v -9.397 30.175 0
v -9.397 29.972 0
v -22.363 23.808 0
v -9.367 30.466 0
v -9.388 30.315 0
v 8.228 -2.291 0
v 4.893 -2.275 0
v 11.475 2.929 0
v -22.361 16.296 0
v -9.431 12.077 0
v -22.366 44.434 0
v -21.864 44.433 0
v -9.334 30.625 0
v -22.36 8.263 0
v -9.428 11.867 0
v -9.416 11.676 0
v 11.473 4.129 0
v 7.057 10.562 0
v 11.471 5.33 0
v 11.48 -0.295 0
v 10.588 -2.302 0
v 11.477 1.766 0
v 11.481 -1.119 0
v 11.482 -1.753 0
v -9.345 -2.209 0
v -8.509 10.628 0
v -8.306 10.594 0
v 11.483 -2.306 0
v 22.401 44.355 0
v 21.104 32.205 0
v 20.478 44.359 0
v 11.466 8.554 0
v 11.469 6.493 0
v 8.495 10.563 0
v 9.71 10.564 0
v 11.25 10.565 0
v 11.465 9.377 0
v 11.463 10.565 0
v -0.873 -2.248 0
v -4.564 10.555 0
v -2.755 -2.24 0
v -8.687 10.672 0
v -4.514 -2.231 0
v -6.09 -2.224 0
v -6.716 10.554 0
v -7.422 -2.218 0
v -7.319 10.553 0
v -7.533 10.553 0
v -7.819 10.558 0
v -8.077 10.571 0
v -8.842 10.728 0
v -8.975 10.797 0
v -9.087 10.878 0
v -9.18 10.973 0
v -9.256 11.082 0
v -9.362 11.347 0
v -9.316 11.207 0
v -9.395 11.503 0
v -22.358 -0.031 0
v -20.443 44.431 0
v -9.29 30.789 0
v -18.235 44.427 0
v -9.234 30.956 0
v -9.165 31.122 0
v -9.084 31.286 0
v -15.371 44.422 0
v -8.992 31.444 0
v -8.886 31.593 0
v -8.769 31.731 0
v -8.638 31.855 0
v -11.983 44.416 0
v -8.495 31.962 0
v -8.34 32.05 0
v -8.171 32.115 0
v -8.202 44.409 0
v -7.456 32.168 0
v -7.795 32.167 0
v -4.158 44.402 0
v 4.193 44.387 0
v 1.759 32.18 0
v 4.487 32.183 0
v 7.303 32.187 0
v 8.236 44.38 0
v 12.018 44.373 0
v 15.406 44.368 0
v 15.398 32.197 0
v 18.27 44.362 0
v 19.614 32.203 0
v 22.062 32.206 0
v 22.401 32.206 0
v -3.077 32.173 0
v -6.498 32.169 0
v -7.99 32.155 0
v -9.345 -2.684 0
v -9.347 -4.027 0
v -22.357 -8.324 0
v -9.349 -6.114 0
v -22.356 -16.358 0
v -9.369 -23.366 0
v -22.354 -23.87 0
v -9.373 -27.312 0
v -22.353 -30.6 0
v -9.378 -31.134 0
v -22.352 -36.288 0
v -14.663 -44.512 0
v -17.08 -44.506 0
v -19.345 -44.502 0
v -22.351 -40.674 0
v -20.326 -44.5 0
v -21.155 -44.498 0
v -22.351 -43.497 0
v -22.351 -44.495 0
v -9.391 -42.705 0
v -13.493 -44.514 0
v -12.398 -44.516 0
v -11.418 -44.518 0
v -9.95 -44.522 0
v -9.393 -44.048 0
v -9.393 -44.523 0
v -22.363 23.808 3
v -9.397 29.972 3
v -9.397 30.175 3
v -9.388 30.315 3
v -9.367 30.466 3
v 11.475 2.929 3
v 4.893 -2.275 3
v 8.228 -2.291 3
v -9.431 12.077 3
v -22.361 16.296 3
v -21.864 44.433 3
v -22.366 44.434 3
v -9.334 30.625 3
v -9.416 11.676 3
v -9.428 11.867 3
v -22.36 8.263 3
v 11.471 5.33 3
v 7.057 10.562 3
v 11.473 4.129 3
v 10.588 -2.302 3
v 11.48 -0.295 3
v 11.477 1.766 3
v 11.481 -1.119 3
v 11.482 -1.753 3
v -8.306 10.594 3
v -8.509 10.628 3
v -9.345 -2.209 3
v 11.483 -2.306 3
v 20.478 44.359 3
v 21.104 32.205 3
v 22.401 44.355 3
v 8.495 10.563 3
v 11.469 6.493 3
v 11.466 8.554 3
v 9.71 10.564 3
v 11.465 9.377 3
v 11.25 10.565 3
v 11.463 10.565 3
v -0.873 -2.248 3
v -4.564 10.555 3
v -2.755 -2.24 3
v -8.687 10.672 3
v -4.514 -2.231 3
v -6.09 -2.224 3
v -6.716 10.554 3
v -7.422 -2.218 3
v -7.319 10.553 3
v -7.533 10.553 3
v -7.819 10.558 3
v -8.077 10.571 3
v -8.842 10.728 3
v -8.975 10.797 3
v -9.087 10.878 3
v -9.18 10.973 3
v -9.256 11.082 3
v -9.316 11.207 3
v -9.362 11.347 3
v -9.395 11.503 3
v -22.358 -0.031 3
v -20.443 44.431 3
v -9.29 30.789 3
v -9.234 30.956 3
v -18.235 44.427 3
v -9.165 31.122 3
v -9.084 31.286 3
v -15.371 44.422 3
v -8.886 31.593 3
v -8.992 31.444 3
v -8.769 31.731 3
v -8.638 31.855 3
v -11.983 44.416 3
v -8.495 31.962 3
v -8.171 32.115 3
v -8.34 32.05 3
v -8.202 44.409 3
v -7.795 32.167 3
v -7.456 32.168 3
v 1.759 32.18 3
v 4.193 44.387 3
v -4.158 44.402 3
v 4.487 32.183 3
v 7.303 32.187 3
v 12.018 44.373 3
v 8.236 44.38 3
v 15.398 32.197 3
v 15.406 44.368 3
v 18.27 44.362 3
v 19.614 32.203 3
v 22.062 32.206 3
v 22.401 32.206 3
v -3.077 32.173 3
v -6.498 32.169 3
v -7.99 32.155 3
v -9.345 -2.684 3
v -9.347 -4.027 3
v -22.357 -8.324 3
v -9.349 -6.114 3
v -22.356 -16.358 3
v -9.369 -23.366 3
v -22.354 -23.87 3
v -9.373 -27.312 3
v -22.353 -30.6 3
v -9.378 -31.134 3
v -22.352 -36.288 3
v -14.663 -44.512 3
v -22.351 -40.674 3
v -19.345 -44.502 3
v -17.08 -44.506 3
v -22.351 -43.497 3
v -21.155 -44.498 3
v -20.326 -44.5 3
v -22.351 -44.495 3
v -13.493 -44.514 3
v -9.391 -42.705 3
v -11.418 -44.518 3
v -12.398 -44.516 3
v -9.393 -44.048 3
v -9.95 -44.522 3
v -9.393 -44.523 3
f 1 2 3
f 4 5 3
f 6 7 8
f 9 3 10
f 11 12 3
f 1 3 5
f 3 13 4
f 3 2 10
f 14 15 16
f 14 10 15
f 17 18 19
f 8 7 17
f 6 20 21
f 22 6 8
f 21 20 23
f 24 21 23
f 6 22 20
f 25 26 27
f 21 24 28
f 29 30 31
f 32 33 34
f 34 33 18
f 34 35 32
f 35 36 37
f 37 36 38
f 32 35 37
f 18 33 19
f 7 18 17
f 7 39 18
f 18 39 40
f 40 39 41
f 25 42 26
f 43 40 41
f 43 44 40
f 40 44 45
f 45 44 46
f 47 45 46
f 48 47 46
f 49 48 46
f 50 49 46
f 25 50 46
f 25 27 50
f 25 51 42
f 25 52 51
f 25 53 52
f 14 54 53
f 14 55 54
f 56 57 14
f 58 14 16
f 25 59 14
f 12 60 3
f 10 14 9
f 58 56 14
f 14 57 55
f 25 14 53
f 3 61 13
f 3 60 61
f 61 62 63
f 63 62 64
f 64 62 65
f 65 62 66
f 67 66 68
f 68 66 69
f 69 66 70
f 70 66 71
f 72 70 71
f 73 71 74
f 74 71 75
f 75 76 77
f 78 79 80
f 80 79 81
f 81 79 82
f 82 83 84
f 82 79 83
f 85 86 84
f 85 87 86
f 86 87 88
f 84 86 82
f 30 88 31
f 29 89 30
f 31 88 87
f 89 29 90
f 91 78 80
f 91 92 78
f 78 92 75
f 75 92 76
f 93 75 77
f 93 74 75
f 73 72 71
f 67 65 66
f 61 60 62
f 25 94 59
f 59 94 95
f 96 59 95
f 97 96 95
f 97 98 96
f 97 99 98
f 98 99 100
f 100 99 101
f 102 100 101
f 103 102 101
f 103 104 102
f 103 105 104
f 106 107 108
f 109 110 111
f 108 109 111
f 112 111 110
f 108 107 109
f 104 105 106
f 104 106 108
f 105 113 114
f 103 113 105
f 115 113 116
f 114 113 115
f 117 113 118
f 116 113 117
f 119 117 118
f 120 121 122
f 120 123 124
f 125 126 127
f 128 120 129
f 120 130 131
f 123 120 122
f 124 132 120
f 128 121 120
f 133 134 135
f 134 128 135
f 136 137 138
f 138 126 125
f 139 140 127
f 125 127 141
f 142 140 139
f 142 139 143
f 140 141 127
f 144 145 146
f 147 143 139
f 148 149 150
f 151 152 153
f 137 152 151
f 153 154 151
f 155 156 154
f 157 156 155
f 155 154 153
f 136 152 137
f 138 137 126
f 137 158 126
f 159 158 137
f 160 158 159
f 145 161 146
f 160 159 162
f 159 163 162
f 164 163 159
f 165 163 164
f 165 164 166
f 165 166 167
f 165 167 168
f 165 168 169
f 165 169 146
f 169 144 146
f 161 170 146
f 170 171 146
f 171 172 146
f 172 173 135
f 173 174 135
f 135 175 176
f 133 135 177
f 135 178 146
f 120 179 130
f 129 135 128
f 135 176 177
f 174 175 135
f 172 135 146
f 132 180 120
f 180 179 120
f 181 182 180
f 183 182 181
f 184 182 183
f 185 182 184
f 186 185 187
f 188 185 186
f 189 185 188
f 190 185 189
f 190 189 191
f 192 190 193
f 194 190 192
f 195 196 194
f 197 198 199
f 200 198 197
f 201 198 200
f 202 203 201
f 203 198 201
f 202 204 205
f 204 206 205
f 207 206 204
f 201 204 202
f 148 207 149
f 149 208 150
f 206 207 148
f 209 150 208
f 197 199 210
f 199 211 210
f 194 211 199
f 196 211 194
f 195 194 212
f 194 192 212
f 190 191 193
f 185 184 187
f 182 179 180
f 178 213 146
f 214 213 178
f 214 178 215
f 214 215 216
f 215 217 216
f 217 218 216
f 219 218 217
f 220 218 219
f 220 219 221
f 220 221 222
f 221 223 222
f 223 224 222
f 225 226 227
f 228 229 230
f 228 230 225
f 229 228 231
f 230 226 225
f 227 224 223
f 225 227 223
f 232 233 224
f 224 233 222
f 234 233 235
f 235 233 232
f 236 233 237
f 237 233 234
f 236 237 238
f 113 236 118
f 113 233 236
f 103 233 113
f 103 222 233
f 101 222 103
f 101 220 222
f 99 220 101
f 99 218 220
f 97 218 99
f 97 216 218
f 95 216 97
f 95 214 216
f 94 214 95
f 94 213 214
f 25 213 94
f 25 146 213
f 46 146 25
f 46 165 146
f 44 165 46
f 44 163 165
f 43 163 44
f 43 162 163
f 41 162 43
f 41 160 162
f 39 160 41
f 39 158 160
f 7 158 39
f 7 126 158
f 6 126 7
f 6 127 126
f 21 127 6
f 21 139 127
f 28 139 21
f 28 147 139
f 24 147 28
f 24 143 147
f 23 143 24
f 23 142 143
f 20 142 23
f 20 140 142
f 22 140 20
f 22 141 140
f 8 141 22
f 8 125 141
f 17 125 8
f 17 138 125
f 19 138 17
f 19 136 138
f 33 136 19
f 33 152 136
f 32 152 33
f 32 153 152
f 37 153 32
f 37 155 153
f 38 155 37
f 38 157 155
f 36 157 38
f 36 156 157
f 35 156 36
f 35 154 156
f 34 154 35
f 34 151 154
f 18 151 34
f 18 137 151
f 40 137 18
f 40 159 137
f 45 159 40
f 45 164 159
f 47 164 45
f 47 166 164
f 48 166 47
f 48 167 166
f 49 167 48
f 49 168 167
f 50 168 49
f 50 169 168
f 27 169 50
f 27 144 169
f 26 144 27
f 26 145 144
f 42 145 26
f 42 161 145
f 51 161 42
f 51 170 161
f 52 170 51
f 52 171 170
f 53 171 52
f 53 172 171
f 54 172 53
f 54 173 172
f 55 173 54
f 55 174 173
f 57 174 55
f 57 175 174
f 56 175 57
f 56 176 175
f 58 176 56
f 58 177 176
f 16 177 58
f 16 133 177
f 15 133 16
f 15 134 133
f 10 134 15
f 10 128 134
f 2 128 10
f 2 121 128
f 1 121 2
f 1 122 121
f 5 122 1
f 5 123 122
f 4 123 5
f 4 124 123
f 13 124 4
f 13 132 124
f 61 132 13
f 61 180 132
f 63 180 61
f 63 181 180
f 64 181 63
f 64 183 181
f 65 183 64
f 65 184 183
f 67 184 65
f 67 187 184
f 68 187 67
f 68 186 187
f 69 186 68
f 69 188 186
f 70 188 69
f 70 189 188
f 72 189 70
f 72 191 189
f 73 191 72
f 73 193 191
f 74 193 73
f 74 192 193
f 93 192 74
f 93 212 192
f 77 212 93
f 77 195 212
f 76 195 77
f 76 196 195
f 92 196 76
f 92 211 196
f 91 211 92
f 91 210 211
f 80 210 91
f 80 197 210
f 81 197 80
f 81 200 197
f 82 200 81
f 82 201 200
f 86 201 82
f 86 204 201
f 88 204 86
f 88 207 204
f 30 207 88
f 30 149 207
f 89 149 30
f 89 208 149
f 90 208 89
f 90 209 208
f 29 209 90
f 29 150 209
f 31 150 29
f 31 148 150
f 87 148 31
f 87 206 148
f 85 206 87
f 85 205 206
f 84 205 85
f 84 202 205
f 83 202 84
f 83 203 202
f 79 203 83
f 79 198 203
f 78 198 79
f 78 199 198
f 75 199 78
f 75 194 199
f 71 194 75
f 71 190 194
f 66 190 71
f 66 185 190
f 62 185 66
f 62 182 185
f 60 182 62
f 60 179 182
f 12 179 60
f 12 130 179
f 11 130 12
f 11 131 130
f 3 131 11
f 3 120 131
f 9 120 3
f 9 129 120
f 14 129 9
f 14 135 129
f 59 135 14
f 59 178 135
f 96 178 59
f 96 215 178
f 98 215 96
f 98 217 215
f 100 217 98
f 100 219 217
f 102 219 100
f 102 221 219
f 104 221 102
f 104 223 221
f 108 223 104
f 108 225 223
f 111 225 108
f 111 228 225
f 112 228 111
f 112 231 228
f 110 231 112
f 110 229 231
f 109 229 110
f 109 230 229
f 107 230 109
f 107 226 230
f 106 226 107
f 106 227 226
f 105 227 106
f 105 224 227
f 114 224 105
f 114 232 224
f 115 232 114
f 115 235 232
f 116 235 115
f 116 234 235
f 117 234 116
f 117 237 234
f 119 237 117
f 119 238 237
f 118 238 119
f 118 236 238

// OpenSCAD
// Generated from 交通部公路局（原交通部公路總局）「新式號牌使用之英文字、數字字體」author trace
fudge = 0.1;

module glyph_2012_F(h = 3) {
  difference() {
    linear_extrude(height = h)
      polygon(points = [[-22.3664, 44.4339], [-22.3662, 43.4352], [-22.3657, 40.6128], [-22.3649, 36.2271], [-22.3639, 30.5387], [-22.3627, 23.8082], [-22.3614, 16.2962], [-22.3599, 8.263], [-22.3585, -0.0307], [-22.357, -8.3244], [-22.3556, -16.3576], [-22.3542, -23.8697], [-22.3531, -30.6001], [-22.352, -36.2885], [-22.3513, -40.6742], [-22.3508, -43.4966], [-22.3506, -44.4953], [-22.2051, -44.4956], [-21.7938, -44.4965], [-21.1548, -44.4979], [-20.326, -44.4996], [-19.3453, -44.5017], [-18.2508, -44.504], [-17.0803, -44.5065], [-15.8718, -44.5091], [-14.6634, -44.5117], [-13.4929, -44.5141], [-12.3984, -44.5165], [-11.4177, -44.5185], [-10.5889, -44.5203], [-9.9499, -44.5217], [-9.5386, -44.5225], [-9.3931, -44.5228], [-9.3926, -44.0476], [-9.391, -42.7047], [-9.3886, -40.6179], [-9.3855, -37.9113], [-9.3818, -34.7088], [-9.3777, -31.1344], [-9.3734, -27.3121], [-9.3688, -23.3658], [-9.3643, -19.4195], [-9.3599, -15.5972], [-9.3558, -12.0228], [-9.3521, -8.8203], [-9.349, -6.1137], [-9.3467, -4.0269], [-9.3451, -2.6839], [-9.3446, -2.2087], [-9.1107, -2.2098], [-8.4496, -2.2129], [-7.4225, -2.2177], [-6.0903, -2.224], [-4.514, -2.2314], [-2.7547, -2.2396], [-0.8733, -2.2485], [1.0691, -2.2576], [3.0115, -2.2667], [4.8929, -2.2755], [6.6522, -2.2838], [8.2285, -2.2912], [9.5608, -2.2974], [10.5879, -2.3022], [11.2489, -2.3053], [11.4828, -2.3064], [11.4826, -2.1619], [11.482, -1.7534], [11.481, -1.1186], [11.4798, -0.2952], [11.4783, 0.6789], [11.4766, 1.7662], [11.4749, 2.929], [11.473, 4.1294], [11.4712, 5.3298], [11.4695, 6.4926], [11.4678, 7.5799], [11.4663, 8.554], [11.4651, 9.3774], [11.4641, 10.0122], [11.4635, 10.4207], [11.4633, 10.5652], [11.25, 10.5651], [10.6471, 10.5647], [9.7102, 10.5641], [8.4952, 10.5634], [7.0575, 10.5624], [5.4529, 10.5614], [3.7369, 10.5603], [1.9654, 10.5592], [0.1938, 10.5581], [-1.5222, 10.557], [-3.1268, 10.556], [-4.5645, 10.5551], [-5.7795, 10.5543], [-6.7163, 10.5537], [-7.3192, 10.5534], [-7.5326, 10.5532], [-7.8195, 10.5577], [-8.0769, 10.5712], [-8.3064, 10.5943], [-8.5094, 10.6277], [-8.6874, 10.6721], [-8.8421, 10.7282], [-8.9748, 10.7967], [-9.0871, 10.8781], [-9.1804, 10.9731], [-9.2564, 11.0825], [-9.3165, 11.2069], [-9.3622, 11.3469], [-9.395, 11.5032], [-9.4165, 11.6765], [-9.4281, 11.8675], [-9.4314, 12.0768], [-9.431, 12.28], [-9.4299, 12.8544], [-9.4282, 13.7469], [-9.426, 14.9046], [-9.4234, 16.2743], [-9.4205, 17.8031], [-9.4174, 19.438], [-9.4142, 21.1258], [-9.411, 22.8137], [-9.4079, 24.4486], [-9.405, 25.9774], [-9.4024, 27.3471], [-9.4002, 28.5047], [-9.3985, 29.3973], [-9.3974, 29.9717], [-9.397, 30.1749], [-9.3879, 30.315], [-9.3671, 30.4659], [-9.3345, 30.6248], [-9.29, 30.789], [-9.2336, 30.9558], [-9.1651, 31.1223], [-9.0845, 31.2859], [-8.9916, 31.4437], [-8.8864, 31.5929], [-8.7686, 31.7309], [-8.6384, 31.8549], [-8.4955, 31.962], [-8.3398, 32.0496], [-8.1713, 32.1148], [-7.9899, 32.1549], [-7.7954, 32.1672], [-7.4563, 32.1676], [-6.4979, 32.1689], [-5.0087, 32.1708], [-3.0772, 32.1733], [-0.7918, 32.1763], [1.759, 32.1796], [4.4867, 32.1831], [7.3029, 32.1868], [10.1191, 32.1904], [12.8468, 32.1939], [15.3976, 32.1972], [17.683, 32.2002], [19.6145, 32.2027], [21.1037, 32.2046], [22.0621, 32.2059], [22.4013, 32.2063], [22.4013, 32.3427], [22.4013, 32.7283], [22.4013, 33.3275], [22.4013, 34.1046], [22.4013, 35.0241], [22.4013, 36.0503], [22.4013, 37.1478], [22.4013, 38.2808], [22.4013, 39.4138], [22.4013, 40.5113], [22.4013, 41.5375], [22.4013, 42.457], [22.4013, 43.2341], [22.4013, 43.8333], [22.4013, 44.2189], [22.4013, 44.3553], [21.8985, 44.3562], [20.4777, 44.3587], [18.2699, 44.3625], [15.4063, 44.3676], [12.0181, 44.3735], [8.2365, 44.3802], [4.1926, 44.3873], [0.0174, 44.3946], [-4.1577, 44.4019], [-8.2016, 44.409], [-11.9832, 44.4157], [-15.3714, 44.4216], [-18.235, 44.4267], [-20.4428, 44.4306], [-21.8636, 44.433]]);
  }
}

glyph_2012_F();
